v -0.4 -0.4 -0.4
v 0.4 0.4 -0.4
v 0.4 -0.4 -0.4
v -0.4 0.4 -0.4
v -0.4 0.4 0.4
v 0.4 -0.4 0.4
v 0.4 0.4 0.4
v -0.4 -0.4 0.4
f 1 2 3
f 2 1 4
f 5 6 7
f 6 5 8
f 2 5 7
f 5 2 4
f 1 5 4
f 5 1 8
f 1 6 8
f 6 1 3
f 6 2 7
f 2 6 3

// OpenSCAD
use <../lib.scad>
function ldraw_lib__box() = [
// 0 Box 6 (six faces)
// 0 Name: box.dat
// 0 Author: James Jessiman
// 0 !LDRAW_ORG Primitive UPDATE 2002-05
// 0 !LICENSE Licensed under CC BY 2.0 and CC BY 4.0 : see CAreadme.txt
// 
// 0 BFC CERTIFY CCW
  [0,"BFC","CERTIFY"],
  [0,"BFC","CCW"],
// 
// 0 !HISTORY 2002-08-22 [sbliss] Applied BFC
// 0 !HISTORY 2002-11-30 [PTadmin] Official Update 2002-05
// 0 !HISTORY 2007-06-24 [PTadmin] Header formatted for Contributor Agreement
// 0 !HISTORY 2008-07-01 [PTadmin] Official Update 2008-01
// 
// 
// 2 24 1 1 1 -1 1 1
  [2,24,1,1,1,-1,1,1],
// 2 24 -1 1 1 -1 1 -1
  [2,24,-1,1,1,-1,1,-1],
// 2 24 -1 1 -1 1 1 -1
  [2,24,-1,1,-1,1,1,-1],
// 2 24 1 1 -1 1 1 1
  [2,24,1,1,-1,1,1,1],
// 2 24 1 -1 1 -1 -1 1
  [2,24,1,-1,1,-1,-1,1],
// 2 24 -1 -1 1 -1 -1 -1
  [2,24,-1,-1,1,-1,-1,-1],
// 2 24 -1 -1 -1 1 -1 -1
  [2,24,-1,-1,-1,1,-1,-1],
// 2 24 1 -1 -1 1 -1 1
  [2,24,1,-1,-1,1,-1,1],
// 2 24 1 -1 1 1 1 1
  [2,24,1,-1,1,1,1,1],
// 2 24 -1 -1 1 -1 1 1
  [2,24,-1,-1,1,-1,1,1],
// 2 24 1 -1 -1 1 1 -1
  [2,24,1,-1,-1,1,1,-1],
// 2 24 -1 -1 -1 -1 1 -1
  [2,24,-1,-1,-1,-1,1,-1],
// 4 16 1 1 1 1 1 -1 -1 1 -1 -1 1 1
  [4,16,1,1,1,1,1,-1,-1,1,-1,-1,1,1],
// 4 16 -1 -1 -1 1 -1 -1 1 -1 1 -1 -1 1
  [4,16,-1,-1,-1,1,-1,-1,1,-1,1,-1,-1,1],
// 4 16 -1 -1 1 1 -1 1 1 1 1 -1 1 1
  [4,16,-1,-1,1,1,-1,1,1,1,1,-1,1,1],
// 4 16 -1 -1 -1 -1 -1 1 -1 1 1 -1 1 -1
  [4,16,-1,-1,-1,-1,-1,1,-1,1,1,-1,1,-1],
// 4 16 1 -1 -1 -1 -1 -1 -1 1 -1 1 1 -1
  [4,16,1,-1,-1,-1,-1,-1,-1,1,-1,1,1,-1],
// 4 16 1 -1 1 1 -1 -1 1 1 -1 1 1 1
  [4,16,1,-1,1,1,-1,-1,1,1,-1,1,1,1],
// 0
];
makepoly(ldraw_lib__box(), line=0.2);
